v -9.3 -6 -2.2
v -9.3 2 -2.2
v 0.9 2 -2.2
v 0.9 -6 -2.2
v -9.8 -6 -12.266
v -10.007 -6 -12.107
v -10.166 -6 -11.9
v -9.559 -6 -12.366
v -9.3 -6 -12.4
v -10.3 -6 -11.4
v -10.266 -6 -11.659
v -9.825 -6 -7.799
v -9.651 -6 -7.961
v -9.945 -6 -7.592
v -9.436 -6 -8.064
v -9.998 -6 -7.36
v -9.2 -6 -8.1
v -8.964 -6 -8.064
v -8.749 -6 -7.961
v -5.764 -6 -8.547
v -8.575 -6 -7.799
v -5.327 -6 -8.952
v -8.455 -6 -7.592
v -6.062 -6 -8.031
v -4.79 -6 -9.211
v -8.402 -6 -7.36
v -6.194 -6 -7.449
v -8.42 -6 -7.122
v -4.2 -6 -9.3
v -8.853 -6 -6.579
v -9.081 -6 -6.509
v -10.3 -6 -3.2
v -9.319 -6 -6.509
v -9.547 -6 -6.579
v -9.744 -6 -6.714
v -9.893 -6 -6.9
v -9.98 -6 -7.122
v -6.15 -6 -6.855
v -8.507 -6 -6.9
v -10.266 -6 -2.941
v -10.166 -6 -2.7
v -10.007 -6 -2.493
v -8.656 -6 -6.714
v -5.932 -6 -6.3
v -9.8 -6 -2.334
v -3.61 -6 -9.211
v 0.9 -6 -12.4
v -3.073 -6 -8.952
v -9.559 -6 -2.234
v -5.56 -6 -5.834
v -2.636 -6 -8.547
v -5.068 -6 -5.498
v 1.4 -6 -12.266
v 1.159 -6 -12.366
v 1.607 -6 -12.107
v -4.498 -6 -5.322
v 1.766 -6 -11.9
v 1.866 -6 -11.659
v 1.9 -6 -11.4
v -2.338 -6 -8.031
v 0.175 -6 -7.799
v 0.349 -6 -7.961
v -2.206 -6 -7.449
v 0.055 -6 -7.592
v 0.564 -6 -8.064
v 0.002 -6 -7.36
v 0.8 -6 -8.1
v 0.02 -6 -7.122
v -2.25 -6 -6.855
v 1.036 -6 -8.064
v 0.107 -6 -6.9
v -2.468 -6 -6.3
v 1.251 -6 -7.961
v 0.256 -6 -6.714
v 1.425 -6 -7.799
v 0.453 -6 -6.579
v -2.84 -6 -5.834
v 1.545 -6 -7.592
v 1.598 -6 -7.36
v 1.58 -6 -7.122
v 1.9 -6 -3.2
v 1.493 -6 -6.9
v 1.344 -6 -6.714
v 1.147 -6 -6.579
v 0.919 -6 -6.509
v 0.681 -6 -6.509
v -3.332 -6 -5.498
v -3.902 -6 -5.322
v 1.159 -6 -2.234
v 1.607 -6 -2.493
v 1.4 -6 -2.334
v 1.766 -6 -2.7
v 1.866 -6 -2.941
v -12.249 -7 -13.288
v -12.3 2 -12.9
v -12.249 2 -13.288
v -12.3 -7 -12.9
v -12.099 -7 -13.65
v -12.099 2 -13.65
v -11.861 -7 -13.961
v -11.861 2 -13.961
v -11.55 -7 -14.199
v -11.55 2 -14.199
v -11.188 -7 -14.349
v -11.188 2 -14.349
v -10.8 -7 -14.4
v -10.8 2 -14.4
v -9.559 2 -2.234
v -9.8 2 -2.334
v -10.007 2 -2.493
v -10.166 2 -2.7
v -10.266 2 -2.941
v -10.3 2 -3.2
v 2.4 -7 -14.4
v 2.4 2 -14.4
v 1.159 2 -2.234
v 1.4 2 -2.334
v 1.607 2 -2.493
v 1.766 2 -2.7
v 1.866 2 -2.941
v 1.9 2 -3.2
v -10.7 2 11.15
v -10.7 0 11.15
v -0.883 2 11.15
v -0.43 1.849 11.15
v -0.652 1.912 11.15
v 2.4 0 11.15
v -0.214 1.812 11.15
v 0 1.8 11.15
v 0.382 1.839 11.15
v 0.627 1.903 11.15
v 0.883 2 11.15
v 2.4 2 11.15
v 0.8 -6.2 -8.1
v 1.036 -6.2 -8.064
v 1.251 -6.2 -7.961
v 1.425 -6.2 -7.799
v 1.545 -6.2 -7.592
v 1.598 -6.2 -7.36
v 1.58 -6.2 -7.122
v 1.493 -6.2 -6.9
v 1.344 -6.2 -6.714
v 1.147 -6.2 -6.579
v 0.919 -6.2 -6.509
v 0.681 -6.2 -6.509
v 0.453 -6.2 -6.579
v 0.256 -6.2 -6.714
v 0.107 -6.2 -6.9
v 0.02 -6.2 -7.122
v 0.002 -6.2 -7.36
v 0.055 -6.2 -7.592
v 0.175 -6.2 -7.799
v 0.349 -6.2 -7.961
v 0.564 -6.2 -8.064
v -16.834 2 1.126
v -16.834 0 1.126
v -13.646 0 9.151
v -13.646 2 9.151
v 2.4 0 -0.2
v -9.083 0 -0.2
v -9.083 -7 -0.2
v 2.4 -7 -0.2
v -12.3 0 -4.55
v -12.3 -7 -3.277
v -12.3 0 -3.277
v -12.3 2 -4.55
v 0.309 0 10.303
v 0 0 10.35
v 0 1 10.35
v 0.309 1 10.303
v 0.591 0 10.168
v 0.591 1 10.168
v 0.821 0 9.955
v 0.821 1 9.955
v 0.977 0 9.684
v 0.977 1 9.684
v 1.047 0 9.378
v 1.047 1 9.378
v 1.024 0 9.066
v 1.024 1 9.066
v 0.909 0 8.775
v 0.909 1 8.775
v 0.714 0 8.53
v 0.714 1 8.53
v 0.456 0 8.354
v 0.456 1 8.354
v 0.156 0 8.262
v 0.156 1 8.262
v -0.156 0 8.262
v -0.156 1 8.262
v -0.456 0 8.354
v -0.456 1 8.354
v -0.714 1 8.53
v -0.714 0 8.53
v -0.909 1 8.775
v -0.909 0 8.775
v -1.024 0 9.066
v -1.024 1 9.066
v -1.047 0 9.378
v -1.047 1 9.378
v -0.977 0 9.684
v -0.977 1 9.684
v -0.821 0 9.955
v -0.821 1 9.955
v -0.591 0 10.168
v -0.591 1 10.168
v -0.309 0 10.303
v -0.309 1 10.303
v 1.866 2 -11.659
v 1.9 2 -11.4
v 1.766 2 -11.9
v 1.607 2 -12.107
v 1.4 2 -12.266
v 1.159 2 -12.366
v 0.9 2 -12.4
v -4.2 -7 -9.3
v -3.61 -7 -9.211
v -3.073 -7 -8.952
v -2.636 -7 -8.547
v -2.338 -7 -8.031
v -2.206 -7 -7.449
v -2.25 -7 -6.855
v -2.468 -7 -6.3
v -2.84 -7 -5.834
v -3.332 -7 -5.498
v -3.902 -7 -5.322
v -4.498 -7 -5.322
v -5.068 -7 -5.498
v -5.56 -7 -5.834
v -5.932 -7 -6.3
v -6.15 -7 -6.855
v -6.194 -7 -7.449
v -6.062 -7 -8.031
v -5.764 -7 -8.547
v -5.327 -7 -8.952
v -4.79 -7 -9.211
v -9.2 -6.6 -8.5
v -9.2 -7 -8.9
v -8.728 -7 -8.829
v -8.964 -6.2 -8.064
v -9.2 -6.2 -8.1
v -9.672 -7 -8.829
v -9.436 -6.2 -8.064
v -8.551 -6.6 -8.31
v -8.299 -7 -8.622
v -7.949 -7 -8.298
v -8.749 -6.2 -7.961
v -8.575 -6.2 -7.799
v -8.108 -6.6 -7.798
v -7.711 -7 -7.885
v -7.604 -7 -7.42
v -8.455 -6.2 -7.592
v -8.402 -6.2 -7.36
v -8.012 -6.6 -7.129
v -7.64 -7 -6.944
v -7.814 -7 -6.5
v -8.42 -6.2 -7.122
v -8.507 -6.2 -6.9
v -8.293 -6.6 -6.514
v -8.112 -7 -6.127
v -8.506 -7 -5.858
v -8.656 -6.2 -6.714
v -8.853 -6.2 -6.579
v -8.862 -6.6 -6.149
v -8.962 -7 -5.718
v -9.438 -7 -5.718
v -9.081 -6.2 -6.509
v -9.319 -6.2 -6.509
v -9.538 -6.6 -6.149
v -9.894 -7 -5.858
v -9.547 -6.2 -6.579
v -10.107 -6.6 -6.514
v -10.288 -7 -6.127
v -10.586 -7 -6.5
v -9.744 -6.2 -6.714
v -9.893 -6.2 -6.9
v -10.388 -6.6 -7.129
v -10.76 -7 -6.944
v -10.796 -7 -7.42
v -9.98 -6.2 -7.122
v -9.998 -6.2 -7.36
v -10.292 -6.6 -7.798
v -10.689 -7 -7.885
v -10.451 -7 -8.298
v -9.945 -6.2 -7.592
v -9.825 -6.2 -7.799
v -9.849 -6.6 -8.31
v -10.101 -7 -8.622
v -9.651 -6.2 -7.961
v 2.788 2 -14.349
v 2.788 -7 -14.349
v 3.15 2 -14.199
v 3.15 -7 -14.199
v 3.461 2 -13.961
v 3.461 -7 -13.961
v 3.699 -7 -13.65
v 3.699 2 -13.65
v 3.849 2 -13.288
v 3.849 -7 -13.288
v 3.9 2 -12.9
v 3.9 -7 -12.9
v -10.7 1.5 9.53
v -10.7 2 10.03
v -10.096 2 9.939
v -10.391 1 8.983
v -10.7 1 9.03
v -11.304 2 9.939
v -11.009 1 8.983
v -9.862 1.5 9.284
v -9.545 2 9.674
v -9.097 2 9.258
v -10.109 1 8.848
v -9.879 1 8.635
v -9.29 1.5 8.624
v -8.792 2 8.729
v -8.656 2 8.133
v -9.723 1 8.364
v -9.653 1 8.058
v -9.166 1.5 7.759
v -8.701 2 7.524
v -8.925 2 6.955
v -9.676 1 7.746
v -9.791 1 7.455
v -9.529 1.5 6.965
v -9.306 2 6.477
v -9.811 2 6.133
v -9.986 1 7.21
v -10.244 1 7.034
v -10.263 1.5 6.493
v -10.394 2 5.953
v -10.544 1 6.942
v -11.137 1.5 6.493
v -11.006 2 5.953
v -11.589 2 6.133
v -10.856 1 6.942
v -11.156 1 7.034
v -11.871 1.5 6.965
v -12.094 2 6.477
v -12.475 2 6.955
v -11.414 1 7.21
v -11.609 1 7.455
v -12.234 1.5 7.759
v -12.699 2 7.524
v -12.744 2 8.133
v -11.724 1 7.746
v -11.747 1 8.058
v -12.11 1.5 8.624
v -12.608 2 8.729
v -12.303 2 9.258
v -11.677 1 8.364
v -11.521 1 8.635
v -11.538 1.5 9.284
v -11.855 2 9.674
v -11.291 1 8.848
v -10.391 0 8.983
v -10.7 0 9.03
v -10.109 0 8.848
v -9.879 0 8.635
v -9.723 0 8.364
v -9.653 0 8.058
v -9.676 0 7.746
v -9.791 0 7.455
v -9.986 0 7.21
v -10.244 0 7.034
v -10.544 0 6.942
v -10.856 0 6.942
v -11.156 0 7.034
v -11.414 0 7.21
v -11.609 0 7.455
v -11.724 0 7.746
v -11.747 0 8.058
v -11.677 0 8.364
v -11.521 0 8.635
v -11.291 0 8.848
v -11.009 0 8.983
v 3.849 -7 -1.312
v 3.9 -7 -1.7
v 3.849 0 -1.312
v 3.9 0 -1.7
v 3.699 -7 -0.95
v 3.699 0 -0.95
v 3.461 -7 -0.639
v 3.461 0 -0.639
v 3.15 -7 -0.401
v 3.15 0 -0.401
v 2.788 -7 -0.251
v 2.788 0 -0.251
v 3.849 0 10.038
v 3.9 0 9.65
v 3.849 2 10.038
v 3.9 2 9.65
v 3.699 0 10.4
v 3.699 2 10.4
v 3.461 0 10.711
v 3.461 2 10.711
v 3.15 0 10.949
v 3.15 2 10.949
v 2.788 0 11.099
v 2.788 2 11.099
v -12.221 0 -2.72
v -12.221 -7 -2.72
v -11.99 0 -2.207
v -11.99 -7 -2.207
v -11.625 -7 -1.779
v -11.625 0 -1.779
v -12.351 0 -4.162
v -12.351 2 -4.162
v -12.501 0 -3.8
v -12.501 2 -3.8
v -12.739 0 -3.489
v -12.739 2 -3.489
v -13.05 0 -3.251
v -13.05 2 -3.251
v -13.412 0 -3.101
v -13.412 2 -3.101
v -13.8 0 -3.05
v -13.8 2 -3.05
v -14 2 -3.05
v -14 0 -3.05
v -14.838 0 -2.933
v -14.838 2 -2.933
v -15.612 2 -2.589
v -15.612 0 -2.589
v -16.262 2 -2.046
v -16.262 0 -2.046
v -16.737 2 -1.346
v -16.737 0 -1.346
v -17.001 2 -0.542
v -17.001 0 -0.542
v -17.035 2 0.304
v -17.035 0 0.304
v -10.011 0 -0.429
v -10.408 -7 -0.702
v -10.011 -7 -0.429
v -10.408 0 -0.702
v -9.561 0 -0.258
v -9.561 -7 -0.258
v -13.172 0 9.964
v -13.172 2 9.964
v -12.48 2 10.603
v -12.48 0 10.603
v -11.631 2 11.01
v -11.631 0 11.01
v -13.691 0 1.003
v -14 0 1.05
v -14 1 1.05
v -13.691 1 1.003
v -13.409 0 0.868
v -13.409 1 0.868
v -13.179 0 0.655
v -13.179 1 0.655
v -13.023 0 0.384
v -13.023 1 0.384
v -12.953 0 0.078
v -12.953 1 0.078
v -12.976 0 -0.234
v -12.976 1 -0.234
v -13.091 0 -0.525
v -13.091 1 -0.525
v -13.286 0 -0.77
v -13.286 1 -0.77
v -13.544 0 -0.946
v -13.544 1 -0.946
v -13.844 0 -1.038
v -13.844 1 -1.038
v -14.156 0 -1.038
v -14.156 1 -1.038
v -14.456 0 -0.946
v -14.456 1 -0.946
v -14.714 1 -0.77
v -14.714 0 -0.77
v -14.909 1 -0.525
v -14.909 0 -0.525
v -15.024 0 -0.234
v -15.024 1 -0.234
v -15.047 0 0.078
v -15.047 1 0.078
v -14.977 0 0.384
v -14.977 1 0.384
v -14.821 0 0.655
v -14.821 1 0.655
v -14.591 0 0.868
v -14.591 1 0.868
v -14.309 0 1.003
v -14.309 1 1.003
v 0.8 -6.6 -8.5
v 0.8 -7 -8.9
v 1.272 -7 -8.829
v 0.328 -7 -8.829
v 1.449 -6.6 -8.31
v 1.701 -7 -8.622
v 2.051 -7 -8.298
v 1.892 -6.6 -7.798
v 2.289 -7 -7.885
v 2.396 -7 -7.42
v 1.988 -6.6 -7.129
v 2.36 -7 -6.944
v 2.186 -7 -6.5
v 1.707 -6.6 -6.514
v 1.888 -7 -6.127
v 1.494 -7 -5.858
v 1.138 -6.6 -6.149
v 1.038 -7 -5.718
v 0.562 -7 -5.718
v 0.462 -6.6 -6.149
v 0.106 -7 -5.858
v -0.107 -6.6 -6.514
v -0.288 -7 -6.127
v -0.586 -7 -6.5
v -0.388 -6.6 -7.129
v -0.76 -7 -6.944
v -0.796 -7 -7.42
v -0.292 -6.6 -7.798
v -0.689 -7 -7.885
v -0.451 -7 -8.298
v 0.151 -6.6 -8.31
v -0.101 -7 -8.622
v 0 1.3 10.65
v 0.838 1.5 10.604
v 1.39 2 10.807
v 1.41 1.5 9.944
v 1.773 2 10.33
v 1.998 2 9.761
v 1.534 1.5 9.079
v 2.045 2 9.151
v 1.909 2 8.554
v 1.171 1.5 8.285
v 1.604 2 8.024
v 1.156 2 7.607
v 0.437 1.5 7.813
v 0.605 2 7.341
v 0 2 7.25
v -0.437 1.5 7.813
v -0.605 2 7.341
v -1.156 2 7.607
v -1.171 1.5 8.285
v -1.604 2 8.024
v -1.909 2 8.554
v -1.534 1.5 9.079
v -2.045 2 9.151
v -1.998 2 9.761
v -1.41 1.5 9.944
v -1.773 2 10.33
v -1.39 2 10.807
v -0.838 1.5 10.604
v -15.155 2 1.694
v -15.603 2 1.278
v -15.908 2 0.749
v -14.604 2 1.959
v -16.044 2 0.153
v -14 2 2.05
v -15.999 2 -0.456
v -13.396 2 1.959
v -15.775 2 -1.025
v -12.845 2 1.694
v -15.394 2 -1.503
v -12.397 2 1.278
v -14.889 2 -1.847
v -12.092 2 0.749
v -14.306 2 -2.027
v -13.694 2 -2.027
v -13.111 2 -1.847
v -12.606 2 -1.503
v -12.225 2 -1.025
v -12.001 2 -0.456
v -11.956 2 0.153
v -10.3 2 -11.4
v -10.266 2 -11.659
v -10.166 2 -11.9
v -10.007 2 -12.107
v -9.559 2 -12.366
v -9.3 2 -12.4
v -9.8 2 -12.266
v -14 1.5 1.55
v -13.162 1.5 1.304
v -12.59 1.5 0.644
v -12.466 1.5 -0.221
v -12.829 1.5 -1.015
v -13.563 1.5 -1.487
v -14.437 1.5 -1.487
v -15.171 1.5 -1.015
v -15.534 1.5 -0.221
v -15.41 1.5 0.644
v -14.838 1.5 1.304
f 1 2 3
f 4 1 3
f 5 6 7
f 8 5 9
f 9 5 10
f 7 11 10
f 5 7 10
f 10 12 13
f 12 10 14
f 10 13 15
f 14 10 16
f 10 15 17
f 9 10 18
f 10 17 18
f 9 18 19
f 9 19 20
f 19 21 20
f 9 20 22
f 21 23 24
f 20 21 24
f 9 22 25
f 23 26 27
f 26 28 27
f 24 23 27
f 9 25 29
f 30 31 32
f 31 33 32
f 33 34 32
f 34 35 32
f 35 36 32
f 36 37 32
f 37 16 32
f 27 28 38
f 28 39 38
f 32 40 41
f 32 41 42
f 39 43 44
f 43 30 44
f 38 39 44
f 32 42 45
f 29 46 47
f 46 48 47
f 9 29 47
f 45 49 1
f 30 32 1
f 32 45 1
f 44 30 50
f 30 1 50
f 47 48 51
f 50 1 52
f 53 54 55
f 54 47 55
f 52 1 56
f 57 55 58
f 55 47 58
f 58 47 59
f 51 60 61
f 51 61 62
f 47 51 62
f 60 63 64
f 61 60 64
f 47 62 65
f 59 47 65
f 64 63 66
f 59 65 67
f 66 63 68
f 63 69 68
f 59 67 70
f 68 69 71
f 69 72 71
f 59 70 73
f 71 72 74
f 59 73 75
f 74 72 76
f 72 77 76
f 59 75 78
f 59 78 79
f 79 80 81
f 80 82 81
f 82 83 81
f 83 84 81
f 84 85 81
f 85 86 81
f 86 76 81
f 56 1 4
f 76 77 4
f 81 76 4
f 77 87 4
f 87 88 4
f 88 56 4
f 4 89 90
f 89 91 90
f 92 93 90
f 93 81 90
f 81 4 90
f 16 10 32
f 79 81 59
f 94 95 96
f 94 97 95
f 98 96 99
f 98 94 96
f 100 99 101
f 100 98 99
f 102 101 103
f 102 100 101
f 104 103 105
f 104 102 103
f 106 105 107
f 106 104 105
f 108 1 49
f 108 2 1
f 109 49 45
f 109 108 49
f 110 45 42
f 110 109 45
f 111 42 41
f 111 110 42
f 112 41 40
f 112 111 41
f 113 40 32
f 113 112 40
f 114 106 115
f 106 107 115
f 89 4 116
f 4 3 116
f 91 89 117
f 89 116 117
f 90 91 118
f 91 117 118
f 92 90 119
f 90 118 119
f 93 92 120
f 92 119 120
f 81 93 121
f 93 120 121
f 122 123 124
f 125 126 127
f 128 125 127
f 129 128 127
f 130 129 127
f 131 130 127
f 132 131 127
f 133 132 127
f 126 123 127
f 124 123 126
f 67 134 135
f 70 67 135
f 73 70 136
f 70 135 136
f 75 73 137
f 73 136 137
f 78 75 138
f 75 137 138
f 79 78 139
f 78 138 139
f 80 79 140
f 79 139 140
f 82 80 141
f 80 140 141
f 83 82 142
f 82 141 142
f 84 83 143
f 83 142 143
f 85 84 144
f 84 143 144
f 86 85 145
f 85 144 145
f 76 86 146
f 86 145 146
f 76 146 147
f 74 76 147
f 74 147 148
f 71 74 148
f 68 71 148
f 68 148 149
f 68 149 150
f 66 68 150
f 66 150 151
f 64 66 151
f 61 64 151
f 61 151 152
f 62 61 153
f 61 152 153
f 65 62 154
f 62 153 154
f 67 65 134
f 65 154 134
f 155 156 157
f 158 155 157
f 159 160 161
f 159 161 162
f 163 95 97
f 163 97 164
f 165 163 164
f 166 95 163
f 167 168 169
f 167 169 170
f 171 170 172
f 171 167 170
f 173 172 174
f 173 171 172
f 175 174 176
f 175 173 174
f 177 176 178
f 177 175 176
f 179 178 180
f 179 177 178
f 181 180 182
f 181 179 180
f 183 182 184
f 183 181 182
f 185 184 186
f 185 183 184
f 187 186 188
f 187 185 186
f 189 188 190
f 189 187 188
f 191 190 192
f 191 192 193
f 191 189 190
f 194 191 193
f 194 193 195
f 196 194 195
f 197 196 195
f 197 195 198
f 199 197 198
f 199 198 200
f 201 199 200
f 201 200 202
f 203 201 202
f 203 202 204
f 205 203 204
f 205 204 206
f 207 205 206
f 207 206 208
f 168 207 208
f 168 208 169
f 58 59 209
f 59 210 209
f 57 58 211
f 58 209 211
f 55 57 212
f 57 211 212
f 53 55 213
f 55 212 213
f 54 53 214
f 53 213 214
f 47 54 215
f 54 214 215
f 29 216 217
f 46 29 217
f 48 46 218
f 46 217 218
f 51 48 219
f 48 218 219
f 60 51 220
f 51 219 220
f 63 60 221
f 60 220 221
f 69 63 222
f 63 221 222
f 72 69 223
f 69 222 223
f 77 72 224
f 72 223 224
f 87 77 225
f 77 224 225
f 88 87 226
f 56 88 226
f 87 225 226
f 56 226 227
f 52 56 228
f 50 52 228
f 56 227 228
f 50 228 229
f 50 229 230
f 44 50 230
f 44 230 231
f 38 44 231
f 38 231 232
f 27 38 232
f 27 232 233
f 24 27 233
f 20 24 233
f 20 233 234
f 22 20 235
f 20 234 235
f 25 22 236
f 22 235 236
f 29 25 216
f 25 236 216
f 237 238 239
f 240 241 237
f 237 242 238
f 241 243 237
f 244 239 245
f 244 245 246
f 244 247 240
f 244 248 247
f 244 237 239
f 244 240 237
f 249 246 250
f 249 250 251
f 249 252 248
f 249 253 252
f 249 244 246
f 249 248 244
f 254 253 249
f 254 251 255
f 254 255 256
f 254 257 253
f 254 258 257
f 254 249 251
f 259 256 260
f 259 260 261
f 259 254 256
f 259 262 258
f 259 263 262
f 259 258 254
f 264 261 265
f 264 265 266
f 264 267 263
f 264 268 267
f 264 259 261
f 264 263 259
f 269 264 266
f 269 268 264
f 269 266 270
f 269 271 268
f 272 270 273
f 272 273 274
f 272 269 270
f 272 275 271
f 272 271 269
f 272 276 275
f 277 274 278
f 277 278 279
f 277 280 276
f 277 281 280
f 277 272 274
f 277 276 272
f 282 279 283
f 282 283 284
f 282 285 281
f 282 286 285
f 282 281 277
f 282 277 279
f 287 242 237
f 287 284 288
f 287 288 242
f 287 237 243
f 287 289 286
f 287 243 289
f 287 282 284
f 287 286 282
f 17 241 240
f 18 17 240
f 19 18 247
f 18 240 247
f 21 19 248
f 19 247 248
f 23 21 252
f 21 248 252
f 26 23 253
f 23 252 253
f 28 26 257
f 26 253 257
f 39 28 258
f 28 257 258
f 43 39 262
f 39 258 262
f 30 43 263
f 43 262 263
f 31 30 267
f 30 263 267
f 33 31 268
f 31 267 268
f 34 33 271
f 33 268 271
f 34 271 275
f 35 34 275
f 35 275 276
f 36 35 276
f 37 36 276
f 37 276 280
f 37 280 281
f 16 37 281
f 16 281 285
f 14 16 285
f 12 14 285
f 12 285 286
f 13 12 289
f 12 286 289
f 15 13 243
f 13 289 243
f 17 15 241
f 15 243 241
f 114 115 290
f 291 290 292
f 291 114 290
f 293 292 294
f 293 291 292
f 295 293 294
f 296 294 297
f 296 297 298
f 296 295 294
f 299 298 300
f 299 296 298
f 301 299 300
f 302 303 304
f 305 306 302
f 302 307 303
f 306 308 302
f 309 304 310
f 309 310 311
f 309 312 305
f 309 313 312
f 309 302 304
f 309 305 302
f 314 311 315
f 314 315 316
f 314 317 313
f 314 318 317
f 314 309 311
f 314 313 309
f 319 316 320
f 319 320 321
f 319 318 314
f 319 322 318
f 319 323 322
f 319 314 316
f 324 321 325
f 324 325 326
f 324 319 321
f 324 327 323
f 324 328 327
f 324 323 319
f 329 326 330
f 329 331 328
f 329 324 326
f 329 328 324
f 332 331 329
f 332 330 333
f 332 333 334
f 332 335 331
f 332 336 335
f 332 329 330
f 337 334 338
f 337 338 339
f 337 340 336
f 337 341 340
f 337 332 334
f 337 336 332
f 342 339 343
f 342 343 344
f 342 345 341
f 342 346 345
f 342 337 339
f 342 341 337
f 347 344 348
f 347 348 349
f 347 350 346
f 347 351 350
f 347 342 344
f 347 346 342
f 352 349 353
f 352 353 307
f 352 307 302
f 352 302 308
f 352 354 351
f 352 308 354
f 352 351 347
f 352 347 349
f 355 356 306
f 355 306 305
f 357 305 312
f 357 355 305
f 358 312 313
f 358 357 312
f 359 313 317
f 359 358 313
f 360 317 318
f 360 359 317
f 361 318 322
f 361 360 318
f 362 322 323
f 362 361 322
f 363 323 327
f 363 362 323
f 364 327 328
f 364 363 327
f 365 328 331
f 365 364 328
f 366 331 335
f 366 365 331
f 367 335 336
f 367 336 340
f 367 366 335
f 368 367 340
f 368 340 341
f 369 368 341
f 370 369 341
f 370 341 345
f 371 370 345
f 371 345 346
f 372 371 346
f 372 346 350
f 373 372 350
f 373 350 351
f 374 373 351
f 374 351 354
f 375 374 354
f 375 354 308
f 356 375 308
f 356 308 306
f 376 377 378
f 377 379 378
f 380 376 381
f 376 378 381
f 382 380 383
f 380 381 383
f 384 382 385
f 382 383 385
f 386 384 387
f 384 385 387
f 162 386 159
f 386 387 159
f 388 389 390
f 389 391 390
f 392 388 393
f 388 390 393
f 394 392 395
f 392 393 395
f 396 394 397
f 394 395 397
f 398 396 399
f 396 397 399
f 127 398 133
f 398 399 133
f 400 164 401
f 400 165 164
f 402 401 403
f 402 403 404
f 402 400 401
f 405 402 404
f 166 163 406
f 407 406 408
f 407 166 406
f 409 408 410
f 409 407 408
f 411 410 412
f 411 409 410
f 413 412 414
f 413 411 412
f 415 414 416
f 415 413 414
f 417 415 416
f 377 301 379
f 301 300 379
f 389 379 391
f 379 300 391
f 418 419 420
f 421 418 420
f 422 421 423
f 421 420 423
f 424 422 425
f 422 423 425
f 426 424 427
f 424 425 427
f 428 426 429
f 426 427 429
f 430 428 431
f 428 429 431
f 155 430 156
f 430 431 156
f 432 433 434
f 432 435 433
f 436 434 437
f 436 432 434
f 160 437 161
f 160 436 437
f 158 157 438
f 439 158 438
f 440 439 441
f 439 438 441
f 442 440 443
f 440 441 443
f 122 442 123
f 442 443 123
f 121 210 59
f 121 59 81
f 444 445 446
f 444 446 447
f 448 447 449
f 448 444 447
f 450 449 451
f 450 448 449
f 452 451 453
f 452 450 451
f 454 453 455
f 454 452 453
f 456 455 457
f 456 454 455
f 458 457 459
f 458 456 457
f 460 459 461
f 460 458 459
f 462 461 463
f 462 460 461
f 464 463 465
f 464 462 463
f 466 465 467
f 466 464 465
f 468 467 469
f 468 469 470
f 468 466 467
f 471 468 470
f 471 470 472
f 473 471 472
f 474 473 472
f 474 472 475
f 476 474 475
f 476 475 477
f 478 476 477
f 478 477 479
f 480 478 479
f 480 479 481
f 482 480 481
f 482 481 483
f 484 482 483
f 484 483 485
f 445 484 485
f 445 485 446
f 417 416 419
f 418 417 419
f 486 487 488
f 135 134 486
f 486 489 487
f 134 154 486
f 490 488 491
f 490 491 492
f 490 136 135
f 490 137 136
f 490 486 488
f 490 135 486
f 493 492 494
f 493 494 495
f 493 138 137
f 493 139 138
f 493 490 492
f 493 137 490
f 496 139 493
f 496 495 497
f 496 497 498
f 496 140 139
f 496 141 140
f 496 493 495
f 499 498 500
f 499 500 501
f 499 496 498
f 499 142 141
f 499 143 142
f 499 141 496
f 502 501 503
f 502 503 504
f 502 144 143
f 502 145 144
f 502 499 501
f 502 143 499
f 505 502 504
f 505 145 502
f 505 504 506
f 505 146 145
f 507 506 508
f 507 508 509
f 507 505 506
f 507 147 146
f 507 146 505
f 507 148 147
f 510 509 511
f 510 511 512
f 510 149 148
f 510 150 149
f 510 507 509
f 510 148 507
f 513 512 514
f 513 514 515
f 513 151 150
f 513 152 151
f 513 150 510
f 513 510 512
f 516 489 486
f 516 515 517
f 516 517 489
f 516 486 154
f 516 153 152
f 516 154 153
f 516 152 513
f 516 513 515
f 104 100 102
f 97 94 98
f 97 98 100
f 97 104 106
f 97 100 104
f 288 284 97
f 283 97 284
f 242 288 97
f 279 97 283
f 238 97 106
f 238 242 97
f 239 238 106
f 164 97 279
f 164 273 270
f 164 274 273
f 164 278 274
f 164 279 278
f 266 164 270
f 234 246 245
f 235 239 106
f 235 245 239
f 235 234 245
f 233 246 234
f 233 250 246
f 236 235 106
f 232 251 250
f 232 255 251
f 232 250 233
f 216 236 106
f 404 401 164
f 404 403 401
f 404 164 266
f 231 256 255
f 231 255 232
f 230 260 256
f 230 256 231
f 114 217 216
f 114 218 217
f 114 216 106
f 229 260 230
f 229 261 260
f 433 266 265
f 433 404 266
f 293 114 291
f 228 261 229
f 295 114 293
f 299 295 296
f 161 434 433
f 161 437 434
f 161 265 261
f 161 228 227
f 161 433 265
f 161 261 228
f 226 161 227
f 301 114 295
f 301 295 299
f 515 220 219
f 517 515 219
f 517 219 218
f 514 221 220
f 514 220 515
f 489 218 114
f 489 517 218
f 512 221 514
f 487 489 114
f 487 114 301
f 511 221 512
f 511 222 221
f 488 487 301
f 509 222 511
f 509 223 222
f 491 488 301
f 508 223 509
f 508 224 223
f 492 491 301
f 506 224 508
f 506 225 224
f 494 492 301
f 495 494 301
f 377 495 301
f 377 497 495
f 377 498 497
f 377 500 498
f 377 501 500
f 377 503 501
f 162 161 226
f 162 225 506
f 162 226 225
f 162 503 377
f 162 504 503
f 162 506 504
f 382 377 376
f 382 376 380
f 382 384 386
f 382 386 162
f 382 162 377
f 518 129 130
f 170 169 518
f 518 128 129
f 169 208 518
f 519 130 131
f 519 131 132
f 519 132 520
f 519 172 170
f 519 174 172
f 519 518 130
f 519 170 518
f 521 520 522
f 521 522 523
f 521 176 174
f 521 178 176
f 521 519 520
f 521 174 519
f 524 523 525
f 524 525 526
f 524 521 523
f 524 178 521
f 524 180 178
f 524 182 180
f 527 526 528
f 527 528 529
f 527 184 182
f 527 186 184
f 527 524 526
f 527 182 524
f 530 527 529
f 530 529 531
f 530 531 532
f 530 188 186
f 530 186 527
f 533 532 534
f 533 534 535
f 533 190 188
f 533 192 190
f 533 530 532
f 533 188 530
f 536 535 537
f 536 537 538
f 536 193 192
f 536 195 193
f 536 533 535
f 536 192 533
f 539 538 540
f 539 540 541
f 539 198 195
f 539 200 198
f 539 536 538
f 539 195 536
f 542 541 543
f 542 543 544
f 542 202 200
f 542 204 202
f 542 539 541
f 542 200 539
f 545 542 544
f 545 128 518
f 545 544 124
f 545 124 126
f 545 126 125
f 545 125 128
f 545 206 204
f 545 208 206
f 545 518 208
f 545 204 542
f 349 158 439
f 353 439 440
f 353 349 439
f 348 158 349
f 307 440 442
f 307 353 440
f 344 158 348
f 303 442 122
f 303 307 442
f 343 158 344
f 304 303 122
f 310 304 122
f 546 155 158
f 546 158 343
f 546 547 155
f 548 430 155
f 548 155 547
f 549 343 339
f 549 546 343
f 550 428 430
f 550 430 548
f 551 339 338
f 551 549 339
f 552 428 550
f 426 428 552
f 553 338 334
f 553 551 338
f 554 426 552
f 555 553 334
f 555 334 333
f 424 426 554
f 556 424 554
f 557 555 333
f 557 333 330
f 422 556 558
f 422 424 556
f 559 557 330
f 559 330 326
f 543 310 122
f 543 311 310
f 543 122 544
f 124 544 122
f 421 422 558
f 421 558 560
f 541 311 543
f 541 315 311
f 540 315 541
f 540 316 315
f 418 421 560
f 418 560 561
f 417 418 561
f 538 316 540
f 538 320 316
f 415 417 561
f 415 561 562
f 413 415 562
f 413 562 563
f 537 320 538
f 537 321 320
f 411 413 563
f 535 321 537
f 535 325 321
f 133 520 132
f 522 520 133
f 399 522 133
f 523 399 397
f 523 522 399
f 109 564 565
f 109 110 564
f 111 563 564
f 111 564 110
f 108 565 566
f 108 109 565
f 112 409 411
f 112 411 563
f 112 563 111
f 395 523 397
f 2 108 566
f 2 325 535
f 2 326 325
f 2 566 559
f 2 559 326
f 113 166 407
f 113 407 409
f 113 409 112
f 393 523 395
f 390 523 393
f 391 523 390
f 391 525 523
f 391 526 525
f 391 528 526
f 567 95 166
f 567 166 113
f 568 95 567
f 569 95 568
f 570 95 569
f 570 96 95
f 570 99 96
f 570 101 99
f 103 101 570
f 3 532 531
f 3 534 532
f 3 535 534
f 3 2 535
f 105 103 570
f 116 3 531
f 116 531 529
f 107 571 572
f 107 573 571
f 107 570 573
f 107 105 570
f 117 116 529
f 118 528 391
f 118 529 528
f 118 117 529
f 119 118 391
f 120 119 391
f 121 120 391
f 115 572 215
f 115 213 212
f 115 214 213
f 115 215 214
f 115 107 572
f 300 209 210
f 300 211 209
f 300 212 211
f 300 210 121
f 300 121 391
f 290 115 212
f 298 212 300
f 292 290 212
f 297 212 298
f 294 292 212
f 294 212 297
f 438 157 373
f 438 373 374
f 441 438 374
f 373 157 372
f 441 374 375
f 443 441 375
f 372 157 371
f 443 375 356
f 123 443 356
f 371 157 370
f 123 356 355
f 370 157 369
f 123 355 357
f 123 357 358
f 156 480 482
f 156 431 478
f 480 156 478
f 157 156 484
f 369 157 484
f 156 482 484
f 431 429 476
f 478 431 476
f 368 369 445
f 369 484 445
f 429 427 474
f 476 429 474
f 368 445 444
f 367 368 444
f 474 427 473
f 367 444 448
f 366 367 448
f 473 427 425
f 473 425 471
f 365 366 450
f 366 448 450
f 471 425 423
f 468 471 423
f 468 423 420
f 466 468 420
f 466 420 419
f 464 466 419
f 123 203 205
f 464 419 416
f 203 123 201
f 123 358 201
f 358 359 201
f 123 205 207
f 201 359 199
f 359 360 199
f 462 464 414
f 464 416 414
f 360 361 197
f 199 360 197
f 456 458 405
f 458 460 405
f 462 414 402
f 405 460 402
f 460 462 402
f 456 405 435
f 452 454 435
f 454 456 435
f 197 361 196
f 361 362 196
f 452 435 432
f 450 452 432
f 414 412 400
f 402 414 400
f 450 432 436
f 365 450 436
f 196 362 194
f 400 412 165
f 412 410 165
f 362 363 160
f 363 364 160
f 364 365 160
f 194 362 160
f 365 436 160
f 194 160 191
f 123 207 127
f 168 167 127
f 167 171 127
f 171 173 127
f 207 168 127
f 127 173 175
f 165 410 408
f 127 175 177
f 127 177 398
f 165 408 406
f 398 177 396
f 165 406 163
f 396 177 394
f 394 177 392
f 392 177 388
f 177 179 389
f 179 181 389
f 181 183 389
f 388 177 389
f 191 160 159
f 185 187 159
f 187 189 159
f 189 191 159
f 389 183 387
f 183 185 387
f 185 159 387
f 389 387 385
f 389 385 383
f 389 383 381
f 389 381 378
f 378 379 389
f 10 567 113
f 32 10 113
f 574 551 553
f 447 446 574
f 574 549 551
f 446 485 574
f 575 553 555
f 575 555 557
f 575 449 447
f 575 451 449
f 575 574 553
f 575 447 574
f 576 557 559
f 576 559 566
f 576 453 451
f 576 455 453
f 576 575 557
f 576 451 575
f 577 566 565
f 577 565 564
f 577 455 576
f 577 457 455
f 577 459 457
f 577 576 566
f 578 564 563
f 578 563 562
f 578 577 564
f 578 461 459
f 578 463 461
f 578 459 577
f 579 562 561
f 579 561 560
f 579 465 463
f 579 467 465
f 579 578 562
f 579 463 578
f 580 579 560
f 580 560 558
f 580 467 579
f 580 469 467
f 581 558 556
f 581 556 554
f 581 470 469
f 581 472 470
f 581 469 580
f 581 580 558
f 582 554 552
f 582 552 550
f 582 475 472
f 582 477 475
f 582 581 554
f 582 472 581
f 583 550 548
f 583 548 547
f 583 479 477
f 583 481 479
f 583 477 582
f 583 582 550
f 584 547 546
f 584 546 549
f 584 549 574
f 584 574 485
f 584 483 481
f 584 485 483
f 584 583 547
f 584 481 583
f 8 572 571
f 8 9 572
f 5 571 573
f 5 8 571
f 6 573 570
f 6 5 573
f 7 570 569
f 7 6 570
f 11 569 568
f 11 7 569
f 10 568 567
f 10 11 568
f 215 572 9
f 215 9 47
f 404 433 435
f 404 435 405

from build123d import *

# Parameters (mm, degrees)
SKETCH1_R           = 1.05
SKETCH1_W           = 12.2
SKETCH1_H           = 10.2
BOSS_EXTRUDE1_DEPTH = 2
SKETCH2_W           = 16.2
SKETCH2_H           = 14.2
SKETCH2_W_2         = 12.2
SKETCH2_H_2         = 10.2
BOSS_EXTRUDE2_DEPTH = 7
SKETCH4_W           = 16.2
SKETCH4_H           = 14.2
SKETCH4_R           = 2
BOSS_EXTRUDE3_DEPTH = 1
FILLET1_R           = 1.5
CUT_EXTRUDE1_DEPTH  = 7
FILLET2_R           = 2
FILLET3_R           = 1
CHAMFER2_SIZE       = 1
SKETCH6_R           = 0.8
CUT_EXTRUDE2_DEPTH  = 1
CHAMFER3_SIZE       = 0.8


with BuildPart() as part:
    # Sketch1 → Boss-Extrude1 (new body)
    with BuildSketch(Plane(origin=(0, 0, 0), x_dir=(1, 0, 0), z_dir=(0, 1, 0))):
        with BuildLine():
            Line((-16.83443407, -1.126269728), (-13.645952788, -9.15058198))
            ThreePointArc((-13.645952788, -9.15058198), (-12.480190316, -10.602941562), (-10.7, -11.15))
            Line((-10.7, -11.15), (3.9, -11.15))
            Line((3.9, -11.15), (3.9, 0.2))
            Line((3.9, 0.2), (3.9, 14.4))
            Line((3.9, 14.4), (-12.3, 14.4))
            Line((-12.3, 14.4), (-12.3, 3.05))
            Line((-12.3, 3.05), (-14, 3.05))
            ThreePointArc((-14, 3.05), (-16.523650399, 1.712801408), (-16.83443407, -1.126269728))
        make_face()
        with Locations(Location((-14, 0, 0), (0, 0, 270))):
            Circle(SKETCH1_R, mode=Mode.SUBTRACT)
        with Locations(Location((0, -9.3, 0), (0, 0, 270))):
            Circle(SKETCH1_R, mode=Mode.SUBTRACT)
        with Locations(Location((-10.7, -7.98, 0), (0, 0, 270))):
            Circle(SKETCH1_R, mode=Mode.SUBTRACT)
        with Locations((-4.2, 7.3)):
            Rectangle(SKETCH1_W, SKETCH1_H, mode=Mode.SUBTRACT)
    extrude(amount=BOSS_EXTRUDE1_DEPTH)

    # Sketch2 → Boss-Extrude2 (add)
    with BuildSketch(Plane.XZ):
        with Locations((-4.2, -7.3)):
            Rectangle(SKETCH2_W, SKETCH2_H)
        with Locations((-4.2, -7.3)):
            Rectangle(SKETCH2_W_2, SKETCH2_H_2, mode=Mode.SUBTRACT)
    extrude(amount=BOSS_EXTRUDE2_DEPTH)

    # Sketch4 → Boss-Extrude3 (add)
    with BuildSketch(Plane.XZ.offset(7)):
        with Locations((-4.2, -7.3)):
            Rectangle(SKETCH4_W, SKETCH4_H)
        with Locations(Location((-4.2, -7.3, 0), (0, 0, 270))):
            Circle(SKETCH4_R, mode=Mode.SUBTRACT)
    extrude(amount=-BOSS_EXTRUDE3_DEPTH)

    # Fillet1
    fillet1_edges = [part.edges().sort_by_distance(p)[0] for p in [
        (-12.3, -2.5, -14.4),
        (3.9, -2.5, -14.4),
        (3.9, 1, 11.15),
        (-12.3, 1, -3.05),
        (3.9, -3.5, -0.2),
        (-12.3, -3.5, -0.2),
    ]]
    fillet(fillet1_edges, radius=FILLET1_R)

    # Sketch5 → Cut-Extrude1 (cut)
    with BuildSketch(Plane.XZ.offset(7)):
        Polygon((-12.3, -2.375849406), (-12.3, -0.2), (-9.840369616, -0.2), align=None)
    extrude(amount=-CUT_EXTRUDE1_DEPTH, mode=Mode.SUBTRACT)

    # Fillet2
    fillet2_edges = [part.edges().sort_by_distance(p)[0] for p in [
        (-12.3, -3.5, -2.375849406),
        (-9.840369616, -3.5, -0.2),
    ]]
    fillet(fillet2_edges, radius=FILLET2_R)

    # Fillet3
    fillet3_edges = [part.edges().sort_by_distance(p)[0] for p in [
        (1.9, -2, -2.2),
        (1.9, -2, -12.4),
        (-10.3, -2, -12.4),
        (-10.3, -2, -2.2),
    ]]
    fillet(fillet3_edges, radius=FILLET3_R)

    # Chamfer2
    # the kernel refuses this chamfer: 1 mm, written as the material it takes off along each edge
    with BuildSketch(Plane(origin=(-14, 2, 0), x_dir=(0, 0, 1), z_dir=(-1, 0, 0))) as chamfer2_piece_1:
        Polygon((1.05 + CHAMFER2_SIZE, 0), (1.05, -CHAMFER2_SIZE), (1.05, 0), align=None)
    revolve(axis=Axis((-14, 2, 0), (0, 1, 0)), mode=Mode.SUBTRACT)
    with BuildSketch(Plane(origin=(0, 2, 9.3), x_dir=(0, 0, 1), z_dir=(-1, 0, 0))) as chamfer2_piece_2:
        Polygon((1.05 + CHAMFER2_SIZE, 0), (1.05, -CHAMFER2_SIZE), (1.05, 0), align=None)
    revolve(axis=Axis((0, 2, 9.3), (0, 1, 0)), mode=Mode.SUBTRACT)
    with BuildSketch(Plane(origin=(-10.7, 2, 7.98), x_dir=(0, 0, 1), z_dir=(-1, 0, 0))) as chamfer2_piece_3:
        Polygon((1.05 + CHAMFER2_SIZE, 0), (1.05, -CHAMFER2_SIZE), (1.05, 0), align=None)
    revolve(axis=Axis((-10.7, 2, 7.98), (0, 1, 0)), mode=Mode.SUBTRACT)

    # Sketch6 → Cut-Extrude2 (cut)
    with BuildSketch(Plane.XZ.offset(7)):
        with Locations(Location((-9.2, -7.3, 0), (0, 0, 270))):
            Circle(SKETCH6_R)
        with Locations(Location((0.8, -7.3, 0), (0, 0, 270))):
            Circle(SKETCH6_R)
    extrude(amount=-CUT_EXTRUDE2_DEPTH, mode=Mode.SUBTRACT)

    # Chamfer3
    chamfer3_edges = [part.edges().sort_by_distance(p)[0] for p in [
        (-9.2, -7, -6.5),
        (0.8, -7, -6.5),
    ]]
    chamfer(chamfer3_edges, length=CHAMFER3_SIZE)


solid = part.part
